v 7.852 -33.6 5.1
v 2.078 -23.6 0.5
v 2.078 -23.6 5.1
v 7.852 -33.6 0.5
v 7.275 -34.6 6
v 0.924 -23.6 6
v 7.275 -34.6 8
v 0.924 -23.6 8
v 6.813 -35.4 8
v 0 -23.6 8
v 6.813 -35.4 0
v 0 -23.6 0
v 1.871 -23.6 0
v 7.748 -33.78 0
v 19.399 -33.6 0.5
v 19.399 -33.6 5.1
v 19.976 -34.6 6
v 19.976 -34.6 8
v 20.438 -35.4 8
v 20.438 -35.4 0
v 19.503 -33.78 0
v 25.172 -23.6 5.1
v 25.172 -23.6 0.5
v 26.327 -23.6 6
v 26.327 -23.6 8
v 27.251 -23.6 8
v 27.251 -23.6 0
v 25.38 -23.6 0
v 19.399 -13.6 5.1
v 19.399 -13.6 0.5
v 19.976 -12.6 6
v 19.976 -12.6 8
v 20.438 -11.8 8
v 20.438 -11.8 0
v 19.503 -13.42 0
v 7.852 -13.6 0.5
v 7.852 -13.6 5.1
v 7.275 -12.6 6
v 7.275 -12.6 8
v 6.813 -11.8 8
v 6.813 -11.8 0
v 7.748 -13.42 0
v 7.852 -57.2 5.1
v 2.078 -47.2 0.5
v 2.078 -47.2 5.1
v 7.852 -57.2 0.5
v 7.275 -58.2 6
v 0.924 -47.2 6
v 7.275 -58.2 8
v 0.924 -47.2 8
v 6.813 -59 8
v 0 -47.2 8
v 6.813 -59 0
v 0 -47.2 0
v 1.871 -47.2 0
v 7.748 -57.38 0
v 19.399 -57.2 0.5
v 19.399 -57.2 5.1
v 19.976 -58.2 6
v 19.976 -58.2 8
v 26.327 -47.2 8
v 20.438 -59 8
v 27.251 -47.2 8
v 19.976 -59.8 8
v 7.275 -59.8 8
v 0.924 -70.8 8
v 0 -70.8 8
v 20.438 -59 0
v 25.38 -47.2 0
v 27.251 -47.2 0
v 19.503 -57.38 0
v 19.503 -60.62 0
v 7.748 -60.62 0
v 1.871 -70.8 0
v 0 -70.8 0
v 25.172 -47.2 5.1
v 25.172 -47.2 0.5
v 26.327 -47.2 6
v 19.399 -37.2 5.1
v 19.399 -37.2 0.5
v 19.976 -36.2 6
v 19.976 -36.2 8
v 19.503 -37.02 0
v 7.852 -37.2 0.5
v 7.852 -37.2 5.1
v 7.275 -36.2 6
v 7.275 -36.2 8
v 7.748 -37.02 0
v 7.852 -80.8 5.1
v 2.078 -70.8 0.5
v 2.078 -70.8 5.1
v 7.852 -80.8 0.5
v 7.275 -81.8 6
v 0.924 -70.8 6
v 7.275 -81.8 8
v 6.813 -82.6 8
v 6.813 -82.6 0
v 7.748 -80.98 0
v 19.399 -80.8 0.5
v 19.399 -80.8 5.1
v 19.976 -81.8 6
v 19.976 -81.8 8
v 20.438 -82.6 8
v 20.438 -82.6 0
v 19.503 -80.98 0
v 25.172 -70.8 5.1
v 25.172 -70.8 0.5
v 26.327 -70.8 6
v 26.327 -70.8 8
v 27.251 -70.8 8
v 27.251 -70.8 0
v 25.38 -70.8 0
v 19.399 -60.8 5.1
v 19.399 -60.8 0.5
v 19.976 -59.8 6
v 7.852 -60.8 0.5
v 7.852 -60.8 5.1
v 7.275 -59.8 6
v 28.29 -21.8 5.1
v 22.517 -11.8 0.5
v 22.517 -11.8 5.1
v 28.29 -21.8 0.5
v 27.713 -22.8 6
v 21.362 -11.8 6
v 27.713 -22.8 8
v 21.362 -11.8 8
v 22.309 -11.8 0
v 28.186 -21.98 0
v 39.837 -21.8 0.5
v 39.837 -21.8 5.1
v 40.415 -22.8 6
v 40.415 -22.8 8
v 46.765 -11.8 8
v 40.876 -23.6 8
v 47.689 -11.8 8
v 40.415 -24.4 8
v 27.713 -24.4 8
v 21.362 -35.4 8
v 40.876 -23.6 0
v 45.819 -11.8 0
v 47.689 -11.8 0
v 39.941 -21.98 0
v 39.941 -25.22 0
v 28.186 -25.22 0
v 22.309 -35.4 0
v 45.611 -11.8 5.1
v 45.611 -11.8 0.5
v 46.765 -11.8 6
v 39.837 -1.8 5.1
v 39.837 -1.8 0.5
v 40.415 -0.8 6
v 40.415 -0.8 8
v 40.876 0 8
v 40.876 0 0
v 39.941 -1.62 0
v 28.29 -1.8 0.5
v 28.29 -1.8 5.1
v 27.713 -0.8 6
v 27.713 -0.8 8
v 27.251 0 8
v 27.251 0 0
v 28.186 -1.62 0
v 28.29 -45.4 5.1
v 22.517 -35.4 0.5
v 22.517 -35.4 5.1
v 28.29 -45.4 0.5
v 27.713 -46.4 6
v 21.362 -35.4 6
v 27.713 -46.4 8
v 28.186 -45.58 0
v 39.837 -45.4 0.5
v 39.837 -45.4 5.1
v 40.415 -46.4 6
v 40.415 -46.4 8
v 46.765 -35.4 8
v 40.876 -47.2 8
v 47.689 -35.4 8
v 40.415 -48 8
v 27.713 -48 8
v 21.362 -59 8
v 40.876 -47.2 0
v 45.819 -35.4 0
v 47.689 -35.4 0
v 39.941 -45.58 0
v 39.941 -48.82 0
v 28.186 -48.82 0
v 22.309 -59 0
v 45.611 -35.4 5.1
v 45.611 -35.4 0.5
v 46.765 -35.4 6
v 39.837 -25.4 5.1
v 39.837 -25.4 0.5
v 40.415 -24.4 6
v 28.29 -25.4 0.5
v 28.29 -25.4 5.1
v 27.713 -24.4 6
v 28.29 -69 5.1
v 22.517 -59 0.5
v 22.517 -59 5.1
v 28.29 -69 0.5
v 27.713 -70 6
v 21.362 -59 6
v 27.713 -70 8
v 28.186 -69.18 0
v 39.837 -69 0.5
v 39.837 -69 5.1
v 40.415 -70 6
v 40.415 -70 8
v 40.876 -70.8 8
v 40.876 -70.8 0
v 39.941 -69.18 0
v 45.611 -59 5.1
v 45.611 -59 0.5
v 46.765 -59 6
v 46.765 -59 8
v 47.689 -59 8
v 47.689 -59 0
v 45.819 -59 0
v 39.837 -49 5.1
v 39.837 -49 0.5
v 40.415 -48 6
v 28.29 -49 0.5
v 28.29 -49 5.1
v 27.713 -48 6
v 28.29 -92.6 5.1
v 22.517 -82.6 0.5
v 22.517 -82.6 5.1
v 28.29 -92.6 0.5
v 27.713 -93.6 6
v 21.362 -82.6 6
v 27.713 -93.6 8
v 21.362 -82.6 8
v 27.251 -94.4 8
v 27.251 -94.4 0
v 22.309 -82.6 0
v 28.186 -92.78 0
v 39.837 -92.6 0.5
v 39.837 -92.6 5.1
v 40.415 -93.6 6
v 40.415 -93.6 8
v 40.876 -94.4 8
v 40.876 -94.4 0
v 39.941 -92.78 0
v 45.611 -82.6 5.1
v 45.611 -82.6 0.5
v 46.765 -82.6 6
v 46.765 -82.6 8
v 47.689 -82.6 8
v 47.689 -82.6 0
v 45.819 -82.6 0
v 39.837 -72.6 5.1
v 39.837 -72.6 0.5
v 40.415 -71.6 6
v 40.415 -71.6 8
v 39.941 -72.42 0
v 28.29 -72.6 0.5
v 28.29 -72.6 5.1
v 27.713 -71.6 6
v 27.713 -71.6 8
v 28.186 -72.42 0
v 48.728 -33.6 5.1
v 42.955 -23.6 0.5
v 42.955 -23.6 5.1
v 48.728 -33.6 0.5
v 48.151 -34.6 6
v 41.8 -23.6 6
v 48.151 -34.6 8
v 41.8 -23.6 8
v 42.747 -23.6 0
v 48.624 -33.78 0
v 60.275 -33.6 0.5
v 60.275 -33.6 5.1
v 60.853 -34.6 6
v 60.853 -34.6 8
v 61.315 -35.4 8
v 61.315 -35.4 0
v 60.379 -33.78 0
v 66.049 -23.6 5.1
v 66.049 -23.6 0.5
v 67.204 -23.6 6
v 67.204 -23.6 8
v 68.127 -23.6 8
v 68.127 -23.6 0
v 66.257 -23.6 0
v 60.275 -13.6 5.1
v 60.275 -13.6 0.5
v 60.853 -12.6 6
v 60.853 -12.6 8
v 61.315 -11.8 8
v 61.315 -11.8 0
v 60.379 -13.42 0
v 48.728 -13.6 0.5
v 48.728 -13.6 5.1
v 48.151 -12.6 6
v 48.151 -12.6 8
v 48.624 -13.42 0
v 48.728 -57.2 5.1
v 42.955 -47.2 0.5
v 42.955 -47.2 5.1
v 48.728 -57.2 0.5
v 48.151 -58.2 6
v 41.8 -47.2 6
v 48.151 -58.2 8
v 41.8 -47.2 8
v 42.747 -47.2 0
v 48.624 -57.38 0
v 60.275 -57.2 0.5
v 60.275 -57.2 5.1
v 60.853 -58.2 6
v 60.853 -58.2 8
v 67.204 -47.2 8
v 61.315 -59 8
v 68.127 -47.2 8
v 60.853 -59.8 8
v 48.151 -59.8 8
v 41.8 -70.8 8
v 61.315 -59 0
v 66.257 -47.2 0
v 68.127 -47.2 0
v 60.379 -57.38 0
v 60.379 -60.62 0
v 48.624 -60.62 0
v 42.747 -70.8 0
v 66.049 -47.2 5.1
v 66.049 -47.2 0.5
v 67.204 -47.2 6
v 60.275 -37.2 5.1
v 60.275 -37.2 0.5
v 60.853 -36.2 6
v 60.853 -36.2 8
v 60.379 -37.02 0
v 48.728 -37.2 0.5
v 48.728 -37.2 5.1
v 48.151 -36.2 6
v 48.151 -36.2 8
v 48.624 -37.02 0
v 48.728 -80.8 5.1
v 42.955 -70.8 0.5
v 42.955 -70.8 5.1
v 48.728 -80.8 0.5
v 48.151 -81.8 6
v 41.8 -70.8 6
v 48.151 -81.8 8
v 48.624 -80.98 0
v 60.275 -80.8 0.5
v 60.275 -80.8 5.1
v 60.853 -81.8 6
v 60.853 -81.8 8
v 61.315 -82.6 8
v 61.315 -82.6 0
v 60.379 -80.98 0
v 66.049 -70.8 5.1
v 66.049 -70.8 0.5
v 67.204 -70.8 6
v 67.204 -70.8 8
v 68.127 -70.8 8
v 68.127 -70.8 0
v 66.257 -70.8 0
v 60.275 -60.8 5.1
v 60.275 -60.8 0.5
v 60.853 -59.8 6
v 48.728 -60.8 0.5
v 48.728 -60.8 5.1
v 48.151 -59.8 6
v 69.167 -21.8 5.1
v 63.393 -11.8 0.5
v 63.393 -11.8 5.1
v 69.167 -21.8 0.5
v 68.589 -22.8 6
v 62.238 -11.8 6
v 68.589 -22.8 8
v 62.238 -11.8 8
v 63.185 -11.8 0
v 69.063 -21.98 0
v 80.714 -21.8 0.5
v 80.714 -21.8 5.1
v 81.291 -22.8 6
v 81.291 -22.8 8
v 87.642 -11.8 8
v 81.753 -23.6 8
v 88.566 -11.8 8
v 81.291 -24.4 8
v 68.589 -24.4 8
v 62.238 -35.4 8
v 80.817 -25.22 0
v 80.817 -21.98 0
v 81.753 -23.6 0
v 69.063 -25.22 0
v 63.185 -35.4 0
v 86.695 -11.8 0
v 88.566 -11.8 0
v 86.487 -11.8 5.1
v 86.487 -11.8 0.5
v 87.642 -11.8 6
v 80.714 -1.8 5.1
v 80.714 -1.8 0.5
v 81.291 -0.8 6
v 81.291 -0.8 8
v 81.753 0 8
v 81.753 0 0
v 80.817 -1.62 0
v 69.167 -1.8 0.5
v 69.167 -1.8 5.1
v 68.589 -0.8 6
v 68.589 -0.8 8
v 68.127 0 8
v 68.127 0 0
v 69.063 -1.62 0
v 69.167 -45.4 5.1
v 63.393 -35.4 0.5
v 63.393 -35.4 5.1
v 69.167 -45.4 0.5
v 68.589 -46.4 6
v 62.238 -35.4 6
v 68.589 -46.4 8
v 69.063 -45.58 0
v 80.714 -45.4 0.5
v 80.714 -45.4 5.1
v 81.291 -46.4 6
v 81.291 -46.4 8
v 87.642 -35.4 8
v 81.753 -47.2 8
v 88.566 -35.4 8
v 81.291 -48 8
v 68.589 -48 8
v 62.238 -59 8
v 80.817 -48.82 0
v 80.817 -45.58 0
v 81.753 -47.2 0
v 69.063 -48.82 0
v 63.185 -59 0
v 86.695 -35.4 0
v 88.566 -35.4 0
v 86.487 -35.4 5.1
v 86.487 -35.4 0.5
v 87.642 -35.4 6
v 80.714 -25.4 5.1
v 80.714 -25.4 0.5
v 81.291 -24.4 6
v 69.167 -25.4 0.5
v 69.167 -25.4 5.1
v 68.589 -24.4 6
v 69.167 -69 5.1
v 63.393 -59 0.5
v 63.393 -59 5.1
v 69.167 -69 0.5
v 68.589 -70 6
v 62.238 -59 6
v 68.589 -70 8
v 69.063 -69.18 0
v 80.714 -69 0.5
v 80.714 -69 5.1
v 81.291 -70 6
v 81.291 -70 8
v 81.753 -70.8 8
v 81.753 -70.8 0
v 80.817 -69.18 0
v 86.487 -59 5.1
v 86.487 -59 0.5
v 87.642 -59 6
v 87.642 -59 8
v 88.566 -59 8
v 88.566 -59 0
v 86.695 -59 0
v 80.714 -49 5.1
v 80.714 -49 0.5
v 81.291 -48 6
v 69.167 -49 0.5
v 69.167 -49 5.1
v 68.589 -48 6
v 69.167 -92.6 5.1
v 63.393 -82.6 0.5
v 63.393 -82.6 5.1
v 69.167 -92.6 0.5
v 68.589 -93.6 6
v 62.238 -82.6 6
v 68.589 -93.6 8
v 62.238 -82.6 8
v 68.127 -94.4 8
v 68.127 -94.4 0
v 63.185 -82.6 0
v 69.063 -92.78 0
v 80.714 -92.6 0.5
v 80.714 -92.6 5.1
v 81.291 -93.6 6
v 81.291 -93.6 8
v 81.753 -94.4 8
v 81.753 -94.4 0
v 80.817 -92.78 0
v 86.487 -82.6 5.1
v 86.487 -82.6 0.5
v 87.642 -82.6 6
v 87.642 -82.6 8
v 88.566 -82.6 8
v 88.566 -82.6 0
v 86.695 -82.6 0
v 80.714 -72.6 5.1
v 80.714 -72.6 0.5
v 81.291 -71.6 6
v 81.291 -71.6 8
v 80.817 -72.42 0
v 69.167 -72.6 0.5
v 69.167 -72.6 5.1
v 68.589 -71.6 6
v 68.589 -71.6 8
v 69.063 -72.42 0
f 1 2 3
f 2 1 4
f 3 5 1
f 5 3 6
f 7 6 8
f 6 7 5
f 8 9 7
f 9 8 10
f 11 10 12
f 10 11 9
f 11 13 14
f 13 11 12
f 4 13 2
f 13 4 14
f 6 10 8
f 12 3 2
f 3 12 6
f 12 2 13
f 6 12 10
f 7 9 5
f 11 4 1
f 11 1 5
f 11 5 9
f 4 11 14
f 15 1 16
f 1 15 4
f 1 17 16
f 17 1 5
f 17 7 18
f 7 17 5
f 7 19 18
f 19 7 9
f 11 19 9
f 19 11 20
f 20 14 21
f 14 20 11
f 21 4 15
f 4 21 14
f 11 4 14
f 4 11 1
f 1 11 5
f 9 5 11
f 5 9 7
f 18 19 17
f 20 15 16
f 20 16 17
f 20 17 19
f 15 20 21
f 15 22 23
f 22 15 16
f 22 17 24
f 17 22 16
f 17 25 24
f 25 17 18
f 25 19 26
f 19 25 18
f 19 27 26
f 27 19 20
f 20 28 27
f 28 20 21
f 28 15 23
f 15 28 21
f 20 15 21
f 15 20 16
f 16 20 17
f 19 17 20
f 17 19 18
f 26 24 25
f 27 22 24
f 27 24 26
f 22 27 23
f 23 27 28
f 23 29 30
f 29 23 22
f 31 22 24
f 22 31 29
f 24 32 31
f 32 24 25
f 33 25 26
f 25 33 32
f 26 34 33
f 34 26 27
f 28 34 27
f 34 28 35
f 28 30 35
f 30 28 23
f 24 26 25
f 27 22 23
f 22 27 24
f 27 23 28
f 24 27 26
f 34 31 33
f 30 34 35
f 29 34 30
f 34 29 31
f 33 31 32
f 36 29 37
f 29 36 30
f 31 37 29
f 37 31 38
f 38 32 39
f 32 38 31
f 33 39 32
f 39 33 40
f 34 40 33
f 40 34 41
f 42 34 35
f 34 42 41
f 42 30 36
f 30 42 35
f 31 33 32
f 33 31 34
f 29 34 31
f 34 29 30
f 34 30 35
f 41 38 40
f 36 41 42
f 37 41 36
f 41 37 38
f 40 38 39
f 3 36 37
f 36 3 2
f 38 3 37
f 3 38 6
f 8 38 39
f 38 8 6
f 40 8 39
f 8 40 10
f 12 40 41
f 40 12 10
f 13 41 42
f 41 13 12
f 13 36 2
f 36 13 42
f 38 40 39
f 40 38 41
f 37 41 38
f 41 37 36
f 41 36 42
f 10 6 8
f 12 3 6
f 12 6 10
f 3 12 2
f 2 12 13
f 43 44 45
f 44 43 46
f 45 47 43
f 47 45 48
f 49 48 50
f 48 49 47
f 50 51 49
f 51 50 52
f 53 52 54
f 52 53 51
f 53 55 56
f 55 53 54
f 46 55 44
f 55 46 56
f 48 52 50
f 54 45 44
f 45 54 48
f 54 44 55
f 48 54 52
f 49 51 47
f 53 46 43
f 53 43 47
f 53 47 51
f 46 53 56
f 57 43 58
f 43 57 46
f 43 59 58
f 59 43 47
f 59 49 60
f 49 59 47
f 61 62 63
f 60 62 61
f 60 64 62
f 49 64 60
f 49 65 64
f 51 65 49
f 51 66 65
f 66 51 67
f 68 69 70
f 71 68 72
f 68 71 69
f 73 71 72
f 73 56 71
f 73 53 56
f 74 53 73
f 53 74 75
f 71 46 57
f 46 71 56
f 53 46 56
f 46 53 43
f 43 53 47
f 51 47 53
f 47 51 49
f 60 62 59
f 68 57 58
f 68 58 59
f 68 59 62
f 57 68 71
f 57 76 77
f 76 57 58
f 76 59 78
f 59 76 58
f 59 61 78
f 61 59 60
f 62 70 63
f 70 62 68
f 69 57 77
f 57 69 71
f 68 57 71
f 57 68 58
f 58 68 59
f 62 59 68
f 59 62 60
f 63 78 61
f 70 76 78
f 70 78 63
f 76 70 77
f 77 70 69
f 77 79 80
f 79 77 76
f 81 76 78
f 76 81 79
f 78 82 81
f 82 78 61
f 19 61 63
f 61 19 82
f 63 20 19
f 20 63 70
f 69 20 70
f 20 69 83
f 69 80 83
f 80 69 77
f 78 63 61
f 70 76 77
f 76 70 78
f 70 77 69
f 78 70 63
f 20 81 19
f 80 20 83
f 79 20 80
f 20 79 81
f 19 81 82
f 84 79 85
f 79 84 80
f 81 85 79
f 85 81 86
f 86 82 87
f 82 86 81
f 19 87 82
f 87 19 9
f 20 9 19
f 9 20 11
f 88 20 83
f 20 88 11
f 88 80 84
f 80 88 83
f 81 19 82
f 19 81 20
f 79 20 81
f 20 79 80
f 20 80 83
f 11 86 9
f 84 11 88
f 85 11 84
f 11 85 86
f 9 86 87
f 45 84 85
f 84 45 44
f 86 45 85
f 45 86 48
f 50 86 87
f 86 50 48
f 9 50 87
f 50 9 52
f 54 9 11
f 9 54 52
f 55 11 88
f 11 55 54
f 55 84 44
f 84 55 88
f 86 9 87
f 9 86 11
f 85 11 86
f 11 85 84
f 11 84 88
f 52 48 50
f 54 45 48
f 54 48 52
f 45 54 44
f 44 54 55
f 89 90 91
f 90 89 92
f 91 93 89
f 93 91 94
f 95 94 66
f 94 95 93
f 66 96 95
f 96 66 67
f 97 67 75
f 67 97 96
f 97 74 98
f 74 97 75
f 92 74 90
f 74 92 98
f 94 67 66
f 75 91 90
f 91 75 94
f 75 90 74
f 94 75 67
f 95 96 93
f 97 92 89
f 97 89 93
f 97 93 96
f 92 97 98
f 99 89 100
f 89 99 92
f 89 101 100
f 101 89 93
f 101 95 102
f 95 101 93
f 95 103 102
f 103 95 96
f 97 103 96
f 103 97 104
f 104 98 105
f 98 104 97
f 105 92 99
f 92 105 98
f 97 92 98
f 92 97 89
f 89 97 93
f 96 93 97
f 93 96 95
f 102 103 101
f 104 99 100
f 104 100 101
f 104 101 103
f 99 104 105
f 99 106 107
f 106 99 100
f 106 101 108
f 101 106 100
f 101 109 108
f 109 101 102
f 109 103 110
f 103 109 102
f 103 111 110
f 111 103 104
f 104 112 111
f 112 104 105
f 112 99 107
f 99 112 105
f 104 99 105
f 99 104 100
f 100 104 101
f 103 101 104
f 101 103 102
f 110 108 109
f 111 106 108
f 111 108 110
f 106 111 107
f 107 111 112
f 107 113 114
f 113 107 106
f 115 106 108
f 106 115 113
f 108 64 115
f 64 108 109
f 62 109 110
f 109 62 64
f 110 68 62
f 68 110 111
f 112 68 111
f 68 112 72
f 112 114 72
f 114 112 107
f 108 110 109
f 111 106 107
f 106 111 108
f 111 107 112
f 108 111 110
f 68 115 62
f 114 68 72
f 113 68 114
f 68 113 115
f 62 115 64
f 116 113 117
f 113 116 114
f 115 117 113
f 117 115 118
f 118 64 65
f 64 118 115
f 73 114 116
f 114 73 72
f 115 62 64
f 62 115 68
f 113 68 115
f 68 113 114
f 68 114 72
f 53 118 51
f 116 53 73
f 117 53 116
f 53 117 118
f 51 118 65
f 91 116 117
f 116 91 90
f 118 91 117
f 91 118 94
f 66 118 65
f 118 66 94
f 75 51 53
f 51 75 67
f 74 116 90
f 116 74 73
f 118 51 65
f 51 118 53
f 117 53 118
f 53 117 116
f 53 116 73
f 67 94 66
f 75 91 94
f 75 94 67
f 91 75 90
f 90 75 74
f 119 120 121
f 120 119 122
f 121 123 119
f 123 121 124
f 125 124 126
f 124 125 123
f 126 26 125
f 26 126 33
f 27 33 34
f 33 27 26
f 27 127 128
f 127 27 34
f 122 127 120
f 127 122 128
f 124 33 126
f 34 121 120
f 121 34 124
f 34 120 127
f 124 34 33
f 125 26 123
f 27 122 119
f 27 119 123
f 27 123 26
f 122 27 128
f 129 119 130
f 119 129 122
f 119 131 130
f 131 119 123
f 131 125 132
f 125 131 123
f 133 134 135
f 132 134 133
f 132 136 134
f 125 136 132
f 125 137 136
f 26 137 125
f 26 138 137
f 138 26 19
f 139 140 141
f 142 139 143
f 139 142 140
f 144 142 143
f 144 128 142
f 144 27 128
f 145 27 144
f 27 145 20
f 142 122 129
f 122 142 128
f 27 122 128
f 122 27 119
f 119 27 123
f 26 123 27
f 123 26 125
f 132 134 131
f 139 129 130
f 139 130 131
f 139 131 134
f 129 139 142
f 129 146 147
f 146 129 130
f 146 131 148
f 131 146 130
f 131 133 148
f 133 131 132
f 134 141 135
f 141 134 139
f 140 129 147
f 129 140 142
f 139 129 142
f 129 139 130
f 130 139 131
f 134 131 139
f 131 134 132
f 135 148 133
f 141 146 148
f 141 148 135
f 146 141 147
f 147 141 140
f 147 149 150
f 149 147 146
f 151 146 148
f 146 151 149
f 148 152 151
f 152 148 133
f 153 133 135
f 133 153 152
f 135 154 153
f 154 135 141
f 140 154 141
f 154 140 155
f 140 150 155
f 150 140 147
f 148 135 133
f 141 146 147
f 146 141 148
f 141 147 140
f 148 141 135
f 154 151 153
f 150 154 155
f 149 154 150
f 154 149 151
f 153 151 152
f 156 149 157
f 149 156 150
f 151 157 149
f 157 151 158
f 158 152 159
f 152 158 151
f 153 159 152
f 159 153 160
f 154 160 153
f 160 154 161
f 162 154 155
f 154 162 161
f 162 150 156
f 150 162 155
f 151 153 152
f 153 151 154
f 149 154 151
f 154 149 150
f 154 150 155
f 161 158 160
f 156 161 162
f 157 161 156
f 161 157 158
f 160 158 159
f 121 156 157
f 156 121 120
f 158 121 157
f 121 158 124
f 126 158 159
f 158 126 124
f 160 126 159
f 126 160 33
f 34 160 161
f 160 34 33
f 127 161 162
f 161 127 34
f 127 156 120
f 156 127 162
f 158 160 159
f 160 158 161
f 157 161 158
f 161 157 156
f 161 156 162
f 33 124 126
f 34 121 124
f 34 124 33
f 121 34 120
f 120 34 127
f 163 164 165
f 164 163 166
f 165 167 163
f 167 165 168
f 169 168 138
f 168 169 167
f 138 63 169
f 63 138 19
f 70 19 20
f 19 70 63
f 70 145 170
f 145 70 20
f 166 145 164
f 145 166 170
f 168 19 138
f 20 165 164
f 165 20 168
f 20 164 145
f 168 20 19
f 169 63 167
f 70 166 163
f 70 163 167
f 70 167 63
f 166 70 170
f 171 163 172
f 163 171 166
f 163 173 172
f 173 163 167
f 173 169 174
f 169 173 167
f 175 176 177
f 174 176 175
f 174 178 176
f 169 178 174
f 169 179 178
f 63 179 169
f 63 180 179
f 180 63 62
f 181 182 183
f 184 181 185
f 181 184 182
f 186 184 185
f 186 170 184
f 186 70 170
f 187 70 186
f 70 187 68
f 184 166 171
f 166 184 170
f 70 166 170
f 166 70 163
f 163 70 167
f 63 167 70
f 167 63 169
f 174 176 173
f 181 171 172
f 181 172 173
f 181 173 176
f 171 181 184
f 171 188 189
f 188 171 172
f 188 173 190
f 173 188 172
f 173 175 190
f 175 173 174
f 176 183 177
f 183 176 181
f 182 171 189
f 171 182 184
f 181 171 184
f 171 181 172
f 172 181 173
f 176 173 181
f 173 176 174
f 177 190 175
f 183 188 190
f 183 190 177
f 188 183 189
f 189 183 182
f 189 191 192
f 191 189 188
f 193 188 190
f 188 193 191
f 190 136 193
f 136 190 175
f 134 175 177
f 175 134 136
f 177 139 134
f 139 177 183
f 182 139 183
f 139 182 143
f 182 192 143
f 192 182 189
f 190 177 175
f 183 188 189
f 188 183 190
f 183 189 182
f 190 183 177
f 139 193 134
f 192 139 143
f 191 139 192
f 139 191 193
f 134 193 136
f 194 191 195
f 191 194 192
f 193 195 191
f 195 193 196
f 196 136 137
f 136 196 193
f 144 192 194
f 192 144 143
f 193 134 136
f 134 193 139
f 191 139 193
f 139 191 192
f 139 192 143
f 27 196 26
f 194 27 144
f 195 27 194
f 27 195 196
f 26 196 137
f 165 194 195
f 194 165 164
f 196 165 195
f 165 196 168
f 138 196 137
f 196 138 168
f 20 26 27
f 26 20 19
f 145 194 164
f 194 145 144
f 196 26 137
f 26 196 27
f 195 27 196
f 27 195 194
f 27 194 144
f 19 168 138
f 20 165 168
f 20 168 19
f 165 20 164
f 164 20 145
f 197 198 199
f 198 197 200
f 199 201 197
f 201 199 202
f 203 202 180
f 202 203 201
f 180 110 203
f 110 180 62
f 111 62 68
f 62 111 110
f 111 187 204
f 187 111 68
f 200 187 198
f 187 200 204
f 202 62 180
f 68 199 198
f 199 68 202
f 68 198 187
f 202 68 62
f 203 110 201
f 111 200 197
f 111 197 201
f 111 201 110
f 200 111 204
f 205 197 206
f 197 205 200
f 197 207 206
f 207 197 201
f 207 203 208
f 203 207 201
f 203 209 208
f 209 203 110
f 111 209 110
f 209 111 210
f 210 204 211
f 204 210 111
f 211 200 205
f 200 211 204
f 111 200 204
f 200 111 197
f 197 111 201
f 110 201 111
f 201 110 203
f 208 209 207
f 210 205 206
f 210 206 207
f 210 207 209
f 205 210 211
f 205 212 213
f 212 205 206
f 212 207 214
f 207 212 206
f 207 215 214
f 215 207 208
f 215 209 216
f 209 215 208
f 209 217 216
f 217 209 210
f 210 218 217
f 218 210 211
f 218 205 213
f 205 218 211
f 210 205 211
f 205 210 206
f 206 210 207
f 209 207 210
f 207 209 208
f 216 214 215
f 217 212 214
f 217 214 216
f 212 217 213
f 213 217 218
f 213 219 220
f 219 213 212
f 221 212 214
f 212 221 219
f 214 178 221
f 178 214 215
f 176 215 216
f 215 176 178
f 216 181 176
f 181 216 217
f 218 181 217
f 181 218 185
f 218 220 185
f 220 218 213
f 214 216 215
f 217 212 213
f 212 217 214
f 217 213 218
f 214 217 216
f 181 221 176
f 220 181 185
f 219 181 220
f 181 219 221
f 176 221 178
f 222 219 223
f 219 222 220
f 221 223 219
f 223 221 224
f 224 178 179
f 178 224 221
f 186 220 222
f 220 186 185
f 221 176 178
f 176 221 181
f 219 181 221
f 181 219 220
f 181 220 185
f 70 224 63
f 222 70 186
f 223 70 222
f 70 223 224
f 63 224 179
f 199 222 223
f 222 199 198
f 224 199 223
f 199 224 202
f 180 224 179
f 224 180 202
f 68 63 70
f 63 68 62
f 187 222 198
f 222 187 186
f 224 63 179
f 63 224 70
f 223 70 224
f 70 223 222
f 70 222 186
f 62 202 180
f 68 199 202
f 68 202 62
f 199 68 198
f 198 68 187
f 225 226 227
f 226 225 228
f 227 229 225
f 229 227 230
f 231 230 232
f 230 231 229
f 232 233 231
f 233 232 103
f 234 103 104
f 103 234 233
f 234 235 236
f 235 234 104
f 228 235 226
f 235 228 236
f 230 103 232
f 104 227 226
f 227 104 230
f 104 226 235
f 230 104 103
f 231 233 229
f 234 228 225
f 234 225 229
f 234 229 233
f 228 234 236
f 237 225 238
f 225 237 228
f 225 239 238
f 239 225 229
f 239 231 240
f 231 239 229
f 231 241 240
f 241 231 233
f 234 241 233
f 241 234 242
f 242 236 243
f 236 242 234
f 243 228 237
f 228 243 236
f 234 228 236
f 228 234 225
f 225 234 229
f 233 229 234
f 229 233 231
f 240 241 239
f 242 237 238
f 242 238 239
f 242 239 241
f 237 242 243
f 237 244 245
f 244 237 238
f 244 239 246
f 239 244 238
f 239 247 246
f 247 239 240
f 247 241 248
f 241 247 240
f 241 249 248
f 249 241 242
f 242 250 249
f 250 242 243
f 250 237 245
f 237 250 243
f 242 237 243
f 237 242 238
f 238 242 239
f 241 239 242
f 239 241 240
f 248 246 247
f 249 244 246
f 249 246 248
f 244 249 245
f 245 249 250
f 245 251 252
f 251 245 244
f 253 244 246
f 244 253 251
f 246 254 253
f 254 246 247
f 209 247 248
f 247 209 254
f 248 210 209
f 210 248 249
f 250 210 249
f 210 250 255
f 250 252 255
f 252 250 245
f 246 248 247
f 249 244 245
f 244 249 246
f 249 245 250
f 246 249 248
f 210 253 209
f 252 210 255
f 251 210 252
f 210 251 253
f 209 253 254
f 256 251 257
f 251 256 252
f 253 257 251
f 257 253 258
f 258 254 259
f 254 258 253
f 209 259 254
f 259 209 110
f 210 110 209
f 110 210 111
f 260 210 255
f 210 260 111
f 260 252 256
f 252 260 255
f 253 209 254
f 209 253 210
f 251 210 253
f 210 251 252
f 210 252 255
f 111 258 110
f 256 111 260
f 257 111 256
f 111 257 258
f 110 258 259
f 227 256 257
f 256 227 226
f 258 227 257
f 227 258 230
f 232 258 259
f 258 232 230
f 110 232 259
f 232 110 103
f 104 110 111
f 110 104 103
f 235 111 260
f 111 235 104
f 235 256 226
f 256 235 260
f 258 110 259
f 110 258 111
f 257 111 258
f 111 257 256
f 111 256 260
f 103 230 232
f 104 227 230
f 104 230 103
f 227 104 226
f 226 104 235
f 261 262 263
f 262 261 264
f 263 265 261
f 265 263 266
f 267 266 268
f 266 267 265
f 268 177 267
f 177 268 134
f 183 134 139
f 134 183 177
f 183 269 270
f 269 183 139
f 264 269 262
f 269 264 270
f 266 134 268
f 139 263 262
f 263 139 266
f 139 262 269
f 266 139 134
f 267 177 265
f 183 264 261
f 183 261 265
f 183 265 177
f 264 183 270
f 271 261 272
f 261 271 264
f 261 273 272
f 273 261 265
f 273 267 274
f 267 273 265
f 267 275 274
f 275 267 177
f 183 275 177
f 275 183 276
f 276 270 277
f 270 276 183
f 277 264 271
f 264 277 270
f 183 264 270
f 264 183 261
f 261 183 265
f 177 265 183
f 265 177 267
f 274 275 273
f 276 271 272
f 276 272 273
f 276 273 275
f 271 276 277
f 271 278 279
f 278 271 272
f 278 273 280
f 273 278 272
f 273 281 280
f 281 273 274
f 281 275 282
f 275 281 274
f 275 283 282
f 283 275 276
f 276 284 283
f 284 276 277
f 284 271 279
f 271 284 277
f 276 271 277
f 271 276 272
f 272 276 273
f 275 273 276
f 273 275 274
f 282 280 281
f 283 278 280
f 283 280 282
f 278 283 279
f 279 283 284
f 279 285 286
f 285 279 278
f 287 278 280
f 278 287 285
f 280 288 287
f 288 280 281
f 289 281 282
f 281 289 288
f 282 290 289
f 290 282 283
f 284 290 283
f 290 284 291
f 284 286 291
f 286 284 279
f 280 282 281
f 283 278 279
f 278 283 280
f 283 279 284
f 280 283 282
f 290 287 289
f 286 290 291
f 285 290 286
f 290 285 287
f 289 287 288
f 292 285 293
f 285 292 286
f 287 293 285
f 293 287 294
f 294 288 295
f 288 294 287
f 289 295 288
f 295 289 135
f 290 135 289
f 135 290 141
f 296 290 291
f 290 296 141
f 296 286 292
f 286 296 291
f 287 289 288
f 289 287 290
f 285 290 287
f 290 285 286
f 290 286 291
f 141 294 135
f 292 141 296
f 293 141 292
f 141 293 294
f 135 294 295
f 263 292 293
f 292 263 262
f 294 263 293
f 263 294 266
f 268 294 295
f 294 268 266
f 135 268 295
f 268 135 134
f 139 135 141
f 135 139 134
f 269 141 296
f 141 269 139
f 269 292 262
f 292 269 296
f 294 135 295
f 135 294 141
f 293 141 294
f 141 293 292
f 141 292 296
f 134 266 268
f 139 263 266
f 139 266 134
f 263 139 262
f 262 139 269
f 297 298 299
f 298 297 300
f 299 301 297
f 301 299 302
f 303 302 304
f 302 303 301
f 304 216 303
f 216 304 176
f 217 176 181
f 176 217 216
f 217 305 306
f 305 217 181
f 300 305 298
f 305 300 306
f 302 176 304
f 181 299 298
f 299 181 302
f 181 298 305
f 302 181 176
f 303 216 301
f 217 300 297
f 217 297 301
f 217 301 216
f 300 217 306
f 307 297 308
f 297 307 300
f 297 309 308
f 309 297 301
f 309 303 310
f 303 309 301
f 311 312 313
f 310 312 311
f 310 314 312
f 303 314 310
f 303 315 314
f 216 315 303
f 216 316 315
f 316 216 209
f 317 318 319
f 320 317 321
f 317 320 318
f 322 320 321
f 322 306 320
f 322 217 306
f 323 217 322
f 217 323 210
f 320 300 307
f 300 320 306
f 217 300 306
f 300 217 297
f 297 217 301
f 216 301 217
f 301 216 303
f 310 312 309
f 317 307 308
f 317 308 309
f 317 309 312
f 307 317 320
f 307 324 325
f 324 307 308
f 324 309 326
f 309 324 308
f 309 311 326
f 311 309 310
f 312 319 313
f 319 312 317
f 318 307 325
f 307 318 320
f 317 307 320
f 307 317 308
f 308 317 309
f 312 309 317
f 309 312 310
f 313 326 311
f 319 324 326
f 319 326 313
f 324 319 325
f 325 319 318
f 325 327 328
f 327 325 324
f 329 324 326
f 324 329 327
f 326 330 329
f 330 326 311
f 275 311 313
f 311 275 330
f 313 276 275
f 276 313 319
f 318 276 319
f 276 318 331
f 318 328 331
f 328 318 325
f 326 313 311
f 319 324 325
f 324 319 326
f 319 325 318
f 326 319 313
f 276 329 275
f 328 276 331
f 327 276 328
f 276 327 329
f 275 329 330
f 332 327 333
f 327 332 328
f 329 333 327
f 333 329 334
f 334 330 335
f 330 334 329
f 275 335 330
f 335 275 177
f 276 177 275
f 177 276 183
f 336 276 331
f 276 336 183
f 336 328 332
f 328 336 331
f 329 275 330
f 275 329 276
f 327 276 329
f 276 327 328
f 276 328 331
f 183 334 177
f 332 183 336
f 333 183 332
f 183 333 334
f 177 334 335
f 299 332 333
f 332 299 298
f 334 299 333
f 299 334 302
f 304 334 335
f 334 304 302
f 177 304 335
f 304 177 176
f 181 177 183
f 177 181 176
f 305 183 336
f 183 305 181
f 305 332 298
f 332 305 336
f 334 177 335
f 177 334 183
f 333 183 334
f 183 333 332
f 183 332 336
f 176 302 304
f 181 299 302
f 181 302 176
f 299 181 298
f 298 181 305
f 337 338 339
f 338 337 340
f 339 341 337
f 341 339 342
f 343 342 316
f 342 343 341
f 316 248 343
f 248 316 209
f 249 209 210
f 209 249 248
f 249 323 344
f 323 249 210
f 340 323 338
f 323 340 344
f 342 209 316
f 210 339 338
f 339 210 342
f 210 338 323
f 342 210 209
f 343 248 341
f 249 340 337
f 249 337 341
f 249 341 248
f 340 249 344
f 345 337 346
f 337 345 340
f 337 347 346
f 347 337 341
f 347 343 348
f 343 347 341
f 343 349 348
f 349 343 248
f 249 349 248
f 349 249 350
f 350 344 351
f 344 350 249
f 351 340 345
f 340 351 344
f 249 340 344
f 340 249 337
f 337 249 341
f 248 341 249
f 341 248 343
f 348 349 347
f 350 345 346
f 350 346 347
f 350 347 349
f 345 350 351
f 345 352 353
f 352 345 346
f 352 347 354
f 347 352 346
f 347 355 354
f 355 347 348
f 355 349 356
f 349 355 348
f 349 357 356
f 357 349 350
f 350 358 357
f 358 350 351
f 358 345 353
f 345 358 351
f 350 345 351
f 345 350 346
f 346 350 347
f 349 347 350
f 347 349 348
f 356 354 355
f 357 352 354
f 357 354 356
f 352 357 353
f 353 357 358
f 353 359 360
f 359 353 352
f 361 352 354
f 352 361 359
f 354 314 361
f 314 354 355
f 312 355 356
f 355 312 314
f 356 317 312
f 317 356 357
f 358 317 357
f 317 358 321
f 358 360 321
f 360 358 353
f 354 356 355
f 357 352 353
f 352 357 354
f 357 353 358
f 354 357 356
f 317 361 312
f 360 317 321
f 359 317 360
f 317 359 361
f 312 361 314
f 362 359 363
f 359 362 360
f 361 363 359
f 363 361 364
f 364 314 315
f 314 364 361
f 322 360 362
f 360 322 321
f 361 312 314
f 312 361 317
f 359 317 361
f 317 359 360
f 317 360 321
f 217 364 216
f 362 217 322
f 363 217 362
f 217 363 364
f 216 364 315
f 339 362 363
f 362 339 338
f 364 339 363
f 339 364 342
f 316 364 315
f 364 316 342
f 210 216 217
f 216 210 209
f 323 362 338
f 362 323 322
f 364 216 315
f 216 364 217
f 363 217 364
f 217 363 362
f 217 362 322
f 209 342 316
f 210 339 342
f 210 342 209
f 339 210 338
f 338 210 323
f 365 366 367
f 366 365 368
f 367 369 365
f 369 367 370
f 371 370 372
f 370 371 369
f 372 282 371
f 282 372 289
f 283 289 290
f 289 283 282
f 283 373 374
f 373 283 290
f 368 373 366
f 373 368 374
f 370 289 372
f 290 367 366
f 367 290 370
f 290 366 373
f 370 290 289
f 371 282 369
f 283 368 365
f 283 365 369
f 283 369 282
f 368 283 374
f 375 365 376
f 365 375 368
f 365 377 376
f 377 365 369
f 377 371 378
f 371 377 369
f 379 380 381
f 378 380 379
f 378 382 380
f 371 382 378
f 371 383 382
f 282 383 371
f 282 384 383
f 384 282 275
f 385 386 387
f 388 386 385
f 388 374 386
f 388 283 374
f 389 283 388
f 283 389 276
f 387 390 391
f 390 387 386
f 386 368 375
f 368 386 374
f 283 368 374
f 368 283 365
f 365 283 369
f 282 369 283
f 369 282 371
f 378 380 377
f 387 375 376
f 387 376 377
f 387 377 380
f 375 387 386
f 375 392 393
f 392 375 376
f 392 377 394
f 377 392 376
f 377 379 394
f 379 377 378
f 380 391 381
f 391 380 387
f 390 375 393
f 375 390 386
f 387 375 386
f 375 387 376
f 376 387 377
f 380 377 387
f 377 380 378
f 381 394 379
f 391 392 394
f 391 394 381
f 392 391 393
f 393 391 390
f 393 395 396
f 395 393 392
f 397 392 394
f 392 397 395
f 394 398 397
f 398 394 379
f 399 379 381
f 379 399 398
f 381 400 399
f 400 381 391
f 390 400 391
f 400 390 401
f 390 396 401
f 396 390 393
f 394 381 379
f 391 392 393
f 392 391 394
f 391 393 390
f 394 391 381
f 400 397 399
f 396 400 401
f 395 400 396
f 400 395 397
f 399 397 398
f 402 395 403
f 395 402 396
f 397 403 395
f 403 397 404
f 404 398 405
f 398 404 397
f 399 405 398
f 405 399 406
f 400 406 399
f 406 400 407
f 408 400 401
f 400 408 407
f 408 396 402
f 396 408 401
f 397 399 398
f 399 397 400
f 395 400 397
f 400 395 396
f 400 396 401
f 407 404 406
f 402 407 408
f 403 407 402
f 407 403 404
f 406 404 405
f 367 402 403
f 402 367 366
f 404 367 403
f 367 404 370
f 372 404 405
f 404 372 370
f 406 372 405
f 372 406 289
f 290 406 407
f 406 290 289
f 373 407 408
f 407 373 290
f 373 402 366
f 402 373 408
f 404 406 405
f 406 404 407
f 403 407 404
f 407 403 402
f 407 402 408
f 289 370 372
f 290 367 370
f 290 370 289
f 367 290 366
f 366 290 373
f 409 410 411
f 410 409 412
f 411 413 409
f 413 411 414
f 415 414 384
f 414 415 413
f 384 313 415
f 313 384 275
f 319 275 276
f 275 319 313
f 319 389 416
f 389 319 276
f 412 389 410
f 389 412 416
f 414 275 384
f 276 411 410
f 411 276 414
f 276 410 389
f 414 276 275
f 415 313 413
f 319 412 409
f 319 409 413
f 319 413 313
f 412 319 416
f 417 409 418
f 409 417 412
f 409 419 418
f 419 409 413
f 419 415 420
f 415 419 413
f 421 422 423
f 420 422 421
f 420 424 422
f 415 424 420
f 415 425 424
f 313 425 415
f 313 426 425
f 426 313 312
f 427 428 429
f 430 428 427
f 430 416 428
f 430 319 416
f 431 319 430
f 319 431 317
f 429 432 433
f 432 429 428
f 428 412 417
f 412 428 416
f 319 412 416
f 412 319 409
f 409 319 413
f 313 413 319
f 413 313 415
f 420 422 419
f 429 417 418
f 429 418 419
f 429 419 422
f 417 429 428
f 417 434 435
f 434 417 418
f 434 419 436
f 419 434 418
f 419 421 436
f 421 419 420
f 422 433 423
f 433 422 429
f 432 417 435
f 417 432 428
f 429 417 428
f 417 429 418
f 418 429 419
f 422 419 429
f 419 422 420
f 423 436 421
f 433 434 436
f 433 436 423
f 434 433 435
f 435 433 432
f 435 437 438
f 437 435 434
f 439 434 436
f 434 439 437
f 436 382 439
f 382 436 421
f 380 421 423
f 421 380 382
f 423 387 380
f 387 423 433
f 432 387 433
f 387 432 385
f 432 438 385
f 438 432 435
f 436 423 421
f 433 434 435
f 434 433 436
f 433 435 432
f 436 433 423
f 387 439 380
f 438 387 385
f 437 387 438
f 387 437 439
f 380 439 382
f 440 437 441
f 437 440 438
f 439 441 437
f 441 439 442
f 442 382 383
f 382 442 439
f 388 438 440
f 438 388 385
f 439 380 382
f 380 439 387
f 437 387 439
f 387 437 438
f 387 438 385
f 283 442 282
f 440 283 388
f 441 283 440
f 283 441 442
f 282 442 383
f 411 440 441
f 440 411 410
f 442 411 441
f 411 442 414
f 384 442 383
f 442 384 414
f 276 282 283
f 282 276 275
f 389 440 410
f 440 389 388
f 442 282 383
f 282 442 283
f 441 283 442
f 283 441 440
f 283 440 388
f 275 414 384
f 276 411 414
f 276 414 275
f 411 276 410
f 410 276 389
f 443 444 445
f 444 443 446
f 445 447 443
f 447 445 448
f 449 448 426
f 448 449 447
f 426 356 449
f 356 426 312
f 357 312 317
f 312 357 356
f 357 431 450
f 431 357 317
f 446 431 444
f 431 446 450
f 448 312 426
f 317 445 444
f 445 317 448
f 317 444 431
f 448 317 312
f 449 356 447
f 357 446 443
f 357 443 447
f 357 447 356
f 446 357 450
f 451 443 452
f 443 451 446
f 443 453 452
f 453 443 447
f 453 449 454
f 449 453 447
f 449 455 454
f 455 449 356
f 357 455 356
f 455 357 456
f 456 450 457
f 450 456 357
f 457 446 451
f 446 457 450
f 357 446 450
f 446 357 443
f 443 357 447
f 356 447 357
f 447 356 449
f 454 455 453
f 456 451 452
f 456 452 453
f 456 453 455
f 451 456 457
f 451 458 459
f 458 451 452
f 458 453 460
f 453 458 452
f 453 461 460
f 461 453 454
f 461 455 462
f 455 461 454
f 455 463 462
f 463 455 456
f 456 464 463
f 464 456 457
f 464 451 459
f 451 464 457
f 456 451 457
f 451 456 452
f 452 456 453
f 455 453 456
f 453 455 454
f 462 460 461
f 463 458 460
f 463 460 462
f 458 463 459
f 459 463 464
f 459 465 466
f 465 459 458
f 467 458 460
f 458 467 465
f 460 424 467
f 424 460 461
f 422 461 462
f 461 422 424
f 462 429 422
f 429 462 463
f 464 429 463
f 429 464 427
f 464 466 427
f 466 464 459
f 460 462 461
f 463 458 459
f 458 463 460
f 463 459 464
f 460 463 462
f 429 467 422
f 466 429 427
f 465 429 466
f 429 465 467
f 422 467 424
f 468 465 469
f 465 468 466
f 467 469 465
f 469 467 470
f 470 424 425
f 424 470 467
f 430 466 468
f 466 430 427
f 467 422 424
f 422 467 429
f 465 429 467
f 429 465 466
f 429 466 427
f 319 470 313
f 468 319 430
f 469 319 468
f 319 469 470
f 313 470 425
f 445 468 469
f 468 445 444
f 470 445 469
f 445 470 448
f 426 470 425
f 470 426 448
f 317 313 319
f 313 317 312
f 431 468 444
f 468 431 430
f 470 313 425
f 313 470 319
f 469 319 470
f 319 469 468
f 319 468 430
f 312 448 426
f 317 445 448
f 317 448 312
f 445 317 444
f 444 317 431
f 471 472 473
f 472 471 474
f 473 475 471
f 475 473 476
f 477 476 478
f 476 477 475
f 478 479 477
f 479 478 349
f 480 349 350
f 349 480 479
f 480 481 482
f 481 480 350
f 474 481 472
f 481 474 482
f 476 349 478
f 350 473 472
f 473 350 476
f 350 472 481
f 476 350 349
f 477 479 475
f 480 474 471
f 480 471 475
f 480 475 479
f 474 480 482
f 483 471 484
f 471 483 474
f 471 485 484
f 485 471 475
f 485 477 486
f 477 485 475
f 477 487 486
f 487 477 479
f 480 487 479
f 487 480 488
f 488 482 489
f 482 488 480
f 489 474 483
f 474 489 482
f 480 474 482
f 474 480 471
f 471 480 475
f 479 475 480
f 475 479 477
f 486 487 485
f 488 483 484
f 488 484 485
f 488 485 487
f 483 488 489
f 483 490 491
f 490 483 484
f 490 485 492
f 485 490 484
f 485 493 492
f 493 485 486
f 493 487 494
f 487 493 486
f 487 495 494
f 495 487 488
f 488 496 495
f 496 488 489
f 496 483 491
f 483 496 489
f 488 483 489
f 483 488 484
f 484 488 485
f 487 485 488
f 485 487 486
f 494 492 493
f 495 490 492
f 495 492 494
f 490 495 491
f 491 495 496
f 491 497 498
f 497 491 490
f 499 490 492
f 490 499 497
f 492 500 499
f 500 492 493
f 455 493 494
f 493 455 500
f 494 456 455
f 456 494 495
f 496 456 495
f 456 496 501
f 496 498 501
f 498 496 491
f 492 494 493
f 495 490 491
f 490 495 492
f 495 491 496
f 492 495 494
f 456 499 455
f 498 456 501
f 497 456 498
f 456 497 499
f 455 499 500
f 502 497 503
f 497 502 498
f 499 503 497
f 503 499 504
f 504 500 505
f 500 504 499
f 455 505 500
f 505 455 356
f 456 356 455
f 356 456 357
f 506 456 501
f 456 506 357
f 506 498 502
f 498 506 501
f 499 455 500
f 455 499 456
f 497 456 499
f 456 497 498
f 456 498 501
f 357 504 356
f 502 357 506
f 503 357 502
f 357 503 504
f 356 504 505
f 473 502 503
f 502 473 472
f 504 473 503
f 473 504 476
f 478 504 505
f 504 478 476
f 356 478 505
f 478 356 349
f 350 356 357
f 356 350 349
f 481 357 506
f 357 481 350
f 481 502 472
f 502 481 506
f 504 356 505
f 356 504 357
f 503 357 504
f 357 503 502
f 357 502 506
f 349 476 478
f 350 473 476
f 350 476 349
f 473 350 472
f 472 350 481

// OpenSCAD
// Honeycomb wall generator
// Adapted from https://www.printables.com/model/380870-customizable-honeycomb-storage-wall-openscad

/*[ Hex unit size ]*/

//Depth of the grid
depth = 8;
//Width of the hexagon's hole (flat side to flat side)
hole_width = 20;
//Thickness of the wall forming each hexagon
wall_thickness = 1.8;

/*[ Grid size settings ]*/
max_grid_width = 100;
max_grid_height = 100;

/*[ Grid shape ]*/
//If checked, ignores custom column sizes and fills grid to maximum size.
fill = true;;flip_staggering = true;
//Amount of hexagons per column. Each entry defines a one column, where the number specifies the amount of hex units that will be generated for the respective column. (Ignored if "fill" is checked)
columns = [3, 5, 8, 6, 4, 3, 4, 5, 6];
include_offsets = false;
//Optional: Offset for each column. This will ignore grid size limits.
column_offsets = [0, -2, -3, -1, 0, 2, 4];
include_gaps = false;
//Optional: Gaps for each column. *NOTE: Change these values in the code. Seems like 2D vector parameters aren't supported by the parameter editor and are always overwritten by the defaults.
column_gaps = [[], [3, 4], [4, 5], [2]];

/*[ Flat edges ]*/
edge_left = false;
edge_top = false;
edge_right = false;
edge_bottom = false;

//Calculated global variables
//Hexagon dimensions
hex_inner_r = hole_width / sqrt(3); //Inner radius/side length (center to point)
hex_h = hole_width + wall_thickness * 2; //Outer side to side distance
hex_s = hex_h / sqrt(3); //Outer radius/side length 
hex_d = 2 * hex_s; //Outer diameter (point to point)
hex_t = hex_s / 2;
//Grid dimensions
max_grid_hexagons_x = fill ? floor(max_grid_width / (hex_d - hex_t) + (edge_left ? 0.5 : 0) + (edge_right ? 0.5 : 0)) : len(columns);
max_grid_hexagons_y = fill ? floor(max_grid_height / hex_h + (edge_top ? 0.5 : 0) + (edge_bottom ? 0.5 : 0)) : max(columns);
max_grid_hexagons_y_lo = fill ? floor(max_grid_height / hex_h - 0.5 + (edge_top ? 0.5 : 0) + (edge_bottom ? 0.5 : 0)) : (max(columns) - 0.5);
total_width = max_grid_hexagons_x * (hex_d - hex_t) + hex_t;
total_height = hex_h * max(max_grid_hexagons_y - 0.5, max_grid_hexagons_y_lo);

translate([edge_left ? 0 : hex_s, edge_top ? 0 : -hex_h / 2, 0])
  grid(columns, include_offsets ? column_offsets : [], include_gaps ? column_gaps : [], depth, hole_width, wall_thickness, fill);

module grid(cols, offsets, gaps, height, hole_width, wall_width, fill) {
  for (hcol = [0:fill ? max_grid_hexagons_x - 1 : (len(cols) - 1)]) {
    for (hrow = [0:(fill ? (max_grid_hexagons_y - 1) : (cols[hcol] - 1))]) {
      skip = hcol < len(gaps) && len(search(hrow + 1, gaps[hcol])) > 0;
      if (!skip) {
        offset_value = hcol > len(offsets) - 1 ? 0 : offsets[hcol];

        lo = (hcol + (flip_staggering ? 1 : 0)) % 2;
        x = (hex_d - hex_t) * hcol;
        y = -(hex_h) * (hrow + offset_value + lo / 2);

        if (hcol < max_grid_hexagons_x && hrow < (lo == 0 ? max_grid_hexagons_y : max_grid_hexagons_y_lo)) {
          left = edge_left && hcol == 0;
          top = edge_top && hrow == 0 && hcol % 2 == (flip_staggering ? 1 : 0);
          right = edge_right && hcol == max_grid_hexagons_x - 1;
          bottom = edge_bottom && hrow + 1 == (lo == 0 ? max_grid_hexagons_y : max_grid_hexagons_y_lo) && -y + hex_h > total_height + 0.001 && -y + hex_h / 2 <= total_height;
          translate([x, y, 0]) halfhex(height, hex_s, wall_width, hole_width, left, top, right, bottom);
        }
      }
    }
  }
}

module halfhex(height, radius, wall_thickness, hole_width, left, top, right, bottom) {
  difference() {
    union() {
      hex(height, radius, wall_thickness, hole_width);
      if (left) translate([0, hex_h / 2, 0]) wall(depth, wall_thickness, hex_h);
      if (top) translate([hex_d / 2, 0, 0]) rotate([0, 0, -90]) wall(depth, wall_thickness, hex_d);
      if (right) translate([0, -hex_h / 2, 0]) rotate([0, 0, 180]) wall(depth, wall_thickness, hex_h);
      if (bottom) translate([-hex_d / 2, 0, 0]) rotate([0, 0, 90]) wall(depth, wall_thickness, hex_d);
    }
    if (left) translate([-hex_d / 2, -hex_h, 0]) cube([hex_d / 2, 2 * hex_h, depth]);
    if (top) translate([-hex_d / 2, 0, 0]) cube([hex_d, hex_h, depth]);
    if (right) translate([0, -hex_h, 0]) cube([hex_d / 2, 2 * hex_h, depth]);
    if (bottom) translate([-hex_d / 2, -hex_h, 0]) cube([hex_d, hex_h, depth]);
  }
}

module hex(height, radius, wall_thickness, hole_width) {
  for (i = [0:5]) {
    rotate([0, 0, i * 60 + 30])
      translate([-hole_width / 2 - wall_thickness, radius / 2, 0])
        wall(height, wall_thickness, radius);
  }
}

module wall(height, wall_thickness, length) {
  hmax = height;
  hmin = 5.1;
  hd = 2;
  tmax = wall_thickness;
  tmin = wall_thickness - 1;
  ft = 0.18; //fillet thickness
  fh = 0.5; //fillet height

  difference() {
    rotate([90, 0, 0])
      linear_extrude(length)
        polygon([[0, 0], [0, hmax], [tmin, hmax], [tmin, hmax - hd], [tmax, hmin], [tmax, fh], [tmax - ft, 0]]);
    //Fillet
    rotate([0, 0, -30])
      cube([4 * tmax, 2 * tmax, hmax]);
    mirror([0, 1, 0])
      translate([0, length, 0])
        rotate([0, 0, -30])
          cube([4 * tmax, 2 * tmax, hmax]);
  }
}
